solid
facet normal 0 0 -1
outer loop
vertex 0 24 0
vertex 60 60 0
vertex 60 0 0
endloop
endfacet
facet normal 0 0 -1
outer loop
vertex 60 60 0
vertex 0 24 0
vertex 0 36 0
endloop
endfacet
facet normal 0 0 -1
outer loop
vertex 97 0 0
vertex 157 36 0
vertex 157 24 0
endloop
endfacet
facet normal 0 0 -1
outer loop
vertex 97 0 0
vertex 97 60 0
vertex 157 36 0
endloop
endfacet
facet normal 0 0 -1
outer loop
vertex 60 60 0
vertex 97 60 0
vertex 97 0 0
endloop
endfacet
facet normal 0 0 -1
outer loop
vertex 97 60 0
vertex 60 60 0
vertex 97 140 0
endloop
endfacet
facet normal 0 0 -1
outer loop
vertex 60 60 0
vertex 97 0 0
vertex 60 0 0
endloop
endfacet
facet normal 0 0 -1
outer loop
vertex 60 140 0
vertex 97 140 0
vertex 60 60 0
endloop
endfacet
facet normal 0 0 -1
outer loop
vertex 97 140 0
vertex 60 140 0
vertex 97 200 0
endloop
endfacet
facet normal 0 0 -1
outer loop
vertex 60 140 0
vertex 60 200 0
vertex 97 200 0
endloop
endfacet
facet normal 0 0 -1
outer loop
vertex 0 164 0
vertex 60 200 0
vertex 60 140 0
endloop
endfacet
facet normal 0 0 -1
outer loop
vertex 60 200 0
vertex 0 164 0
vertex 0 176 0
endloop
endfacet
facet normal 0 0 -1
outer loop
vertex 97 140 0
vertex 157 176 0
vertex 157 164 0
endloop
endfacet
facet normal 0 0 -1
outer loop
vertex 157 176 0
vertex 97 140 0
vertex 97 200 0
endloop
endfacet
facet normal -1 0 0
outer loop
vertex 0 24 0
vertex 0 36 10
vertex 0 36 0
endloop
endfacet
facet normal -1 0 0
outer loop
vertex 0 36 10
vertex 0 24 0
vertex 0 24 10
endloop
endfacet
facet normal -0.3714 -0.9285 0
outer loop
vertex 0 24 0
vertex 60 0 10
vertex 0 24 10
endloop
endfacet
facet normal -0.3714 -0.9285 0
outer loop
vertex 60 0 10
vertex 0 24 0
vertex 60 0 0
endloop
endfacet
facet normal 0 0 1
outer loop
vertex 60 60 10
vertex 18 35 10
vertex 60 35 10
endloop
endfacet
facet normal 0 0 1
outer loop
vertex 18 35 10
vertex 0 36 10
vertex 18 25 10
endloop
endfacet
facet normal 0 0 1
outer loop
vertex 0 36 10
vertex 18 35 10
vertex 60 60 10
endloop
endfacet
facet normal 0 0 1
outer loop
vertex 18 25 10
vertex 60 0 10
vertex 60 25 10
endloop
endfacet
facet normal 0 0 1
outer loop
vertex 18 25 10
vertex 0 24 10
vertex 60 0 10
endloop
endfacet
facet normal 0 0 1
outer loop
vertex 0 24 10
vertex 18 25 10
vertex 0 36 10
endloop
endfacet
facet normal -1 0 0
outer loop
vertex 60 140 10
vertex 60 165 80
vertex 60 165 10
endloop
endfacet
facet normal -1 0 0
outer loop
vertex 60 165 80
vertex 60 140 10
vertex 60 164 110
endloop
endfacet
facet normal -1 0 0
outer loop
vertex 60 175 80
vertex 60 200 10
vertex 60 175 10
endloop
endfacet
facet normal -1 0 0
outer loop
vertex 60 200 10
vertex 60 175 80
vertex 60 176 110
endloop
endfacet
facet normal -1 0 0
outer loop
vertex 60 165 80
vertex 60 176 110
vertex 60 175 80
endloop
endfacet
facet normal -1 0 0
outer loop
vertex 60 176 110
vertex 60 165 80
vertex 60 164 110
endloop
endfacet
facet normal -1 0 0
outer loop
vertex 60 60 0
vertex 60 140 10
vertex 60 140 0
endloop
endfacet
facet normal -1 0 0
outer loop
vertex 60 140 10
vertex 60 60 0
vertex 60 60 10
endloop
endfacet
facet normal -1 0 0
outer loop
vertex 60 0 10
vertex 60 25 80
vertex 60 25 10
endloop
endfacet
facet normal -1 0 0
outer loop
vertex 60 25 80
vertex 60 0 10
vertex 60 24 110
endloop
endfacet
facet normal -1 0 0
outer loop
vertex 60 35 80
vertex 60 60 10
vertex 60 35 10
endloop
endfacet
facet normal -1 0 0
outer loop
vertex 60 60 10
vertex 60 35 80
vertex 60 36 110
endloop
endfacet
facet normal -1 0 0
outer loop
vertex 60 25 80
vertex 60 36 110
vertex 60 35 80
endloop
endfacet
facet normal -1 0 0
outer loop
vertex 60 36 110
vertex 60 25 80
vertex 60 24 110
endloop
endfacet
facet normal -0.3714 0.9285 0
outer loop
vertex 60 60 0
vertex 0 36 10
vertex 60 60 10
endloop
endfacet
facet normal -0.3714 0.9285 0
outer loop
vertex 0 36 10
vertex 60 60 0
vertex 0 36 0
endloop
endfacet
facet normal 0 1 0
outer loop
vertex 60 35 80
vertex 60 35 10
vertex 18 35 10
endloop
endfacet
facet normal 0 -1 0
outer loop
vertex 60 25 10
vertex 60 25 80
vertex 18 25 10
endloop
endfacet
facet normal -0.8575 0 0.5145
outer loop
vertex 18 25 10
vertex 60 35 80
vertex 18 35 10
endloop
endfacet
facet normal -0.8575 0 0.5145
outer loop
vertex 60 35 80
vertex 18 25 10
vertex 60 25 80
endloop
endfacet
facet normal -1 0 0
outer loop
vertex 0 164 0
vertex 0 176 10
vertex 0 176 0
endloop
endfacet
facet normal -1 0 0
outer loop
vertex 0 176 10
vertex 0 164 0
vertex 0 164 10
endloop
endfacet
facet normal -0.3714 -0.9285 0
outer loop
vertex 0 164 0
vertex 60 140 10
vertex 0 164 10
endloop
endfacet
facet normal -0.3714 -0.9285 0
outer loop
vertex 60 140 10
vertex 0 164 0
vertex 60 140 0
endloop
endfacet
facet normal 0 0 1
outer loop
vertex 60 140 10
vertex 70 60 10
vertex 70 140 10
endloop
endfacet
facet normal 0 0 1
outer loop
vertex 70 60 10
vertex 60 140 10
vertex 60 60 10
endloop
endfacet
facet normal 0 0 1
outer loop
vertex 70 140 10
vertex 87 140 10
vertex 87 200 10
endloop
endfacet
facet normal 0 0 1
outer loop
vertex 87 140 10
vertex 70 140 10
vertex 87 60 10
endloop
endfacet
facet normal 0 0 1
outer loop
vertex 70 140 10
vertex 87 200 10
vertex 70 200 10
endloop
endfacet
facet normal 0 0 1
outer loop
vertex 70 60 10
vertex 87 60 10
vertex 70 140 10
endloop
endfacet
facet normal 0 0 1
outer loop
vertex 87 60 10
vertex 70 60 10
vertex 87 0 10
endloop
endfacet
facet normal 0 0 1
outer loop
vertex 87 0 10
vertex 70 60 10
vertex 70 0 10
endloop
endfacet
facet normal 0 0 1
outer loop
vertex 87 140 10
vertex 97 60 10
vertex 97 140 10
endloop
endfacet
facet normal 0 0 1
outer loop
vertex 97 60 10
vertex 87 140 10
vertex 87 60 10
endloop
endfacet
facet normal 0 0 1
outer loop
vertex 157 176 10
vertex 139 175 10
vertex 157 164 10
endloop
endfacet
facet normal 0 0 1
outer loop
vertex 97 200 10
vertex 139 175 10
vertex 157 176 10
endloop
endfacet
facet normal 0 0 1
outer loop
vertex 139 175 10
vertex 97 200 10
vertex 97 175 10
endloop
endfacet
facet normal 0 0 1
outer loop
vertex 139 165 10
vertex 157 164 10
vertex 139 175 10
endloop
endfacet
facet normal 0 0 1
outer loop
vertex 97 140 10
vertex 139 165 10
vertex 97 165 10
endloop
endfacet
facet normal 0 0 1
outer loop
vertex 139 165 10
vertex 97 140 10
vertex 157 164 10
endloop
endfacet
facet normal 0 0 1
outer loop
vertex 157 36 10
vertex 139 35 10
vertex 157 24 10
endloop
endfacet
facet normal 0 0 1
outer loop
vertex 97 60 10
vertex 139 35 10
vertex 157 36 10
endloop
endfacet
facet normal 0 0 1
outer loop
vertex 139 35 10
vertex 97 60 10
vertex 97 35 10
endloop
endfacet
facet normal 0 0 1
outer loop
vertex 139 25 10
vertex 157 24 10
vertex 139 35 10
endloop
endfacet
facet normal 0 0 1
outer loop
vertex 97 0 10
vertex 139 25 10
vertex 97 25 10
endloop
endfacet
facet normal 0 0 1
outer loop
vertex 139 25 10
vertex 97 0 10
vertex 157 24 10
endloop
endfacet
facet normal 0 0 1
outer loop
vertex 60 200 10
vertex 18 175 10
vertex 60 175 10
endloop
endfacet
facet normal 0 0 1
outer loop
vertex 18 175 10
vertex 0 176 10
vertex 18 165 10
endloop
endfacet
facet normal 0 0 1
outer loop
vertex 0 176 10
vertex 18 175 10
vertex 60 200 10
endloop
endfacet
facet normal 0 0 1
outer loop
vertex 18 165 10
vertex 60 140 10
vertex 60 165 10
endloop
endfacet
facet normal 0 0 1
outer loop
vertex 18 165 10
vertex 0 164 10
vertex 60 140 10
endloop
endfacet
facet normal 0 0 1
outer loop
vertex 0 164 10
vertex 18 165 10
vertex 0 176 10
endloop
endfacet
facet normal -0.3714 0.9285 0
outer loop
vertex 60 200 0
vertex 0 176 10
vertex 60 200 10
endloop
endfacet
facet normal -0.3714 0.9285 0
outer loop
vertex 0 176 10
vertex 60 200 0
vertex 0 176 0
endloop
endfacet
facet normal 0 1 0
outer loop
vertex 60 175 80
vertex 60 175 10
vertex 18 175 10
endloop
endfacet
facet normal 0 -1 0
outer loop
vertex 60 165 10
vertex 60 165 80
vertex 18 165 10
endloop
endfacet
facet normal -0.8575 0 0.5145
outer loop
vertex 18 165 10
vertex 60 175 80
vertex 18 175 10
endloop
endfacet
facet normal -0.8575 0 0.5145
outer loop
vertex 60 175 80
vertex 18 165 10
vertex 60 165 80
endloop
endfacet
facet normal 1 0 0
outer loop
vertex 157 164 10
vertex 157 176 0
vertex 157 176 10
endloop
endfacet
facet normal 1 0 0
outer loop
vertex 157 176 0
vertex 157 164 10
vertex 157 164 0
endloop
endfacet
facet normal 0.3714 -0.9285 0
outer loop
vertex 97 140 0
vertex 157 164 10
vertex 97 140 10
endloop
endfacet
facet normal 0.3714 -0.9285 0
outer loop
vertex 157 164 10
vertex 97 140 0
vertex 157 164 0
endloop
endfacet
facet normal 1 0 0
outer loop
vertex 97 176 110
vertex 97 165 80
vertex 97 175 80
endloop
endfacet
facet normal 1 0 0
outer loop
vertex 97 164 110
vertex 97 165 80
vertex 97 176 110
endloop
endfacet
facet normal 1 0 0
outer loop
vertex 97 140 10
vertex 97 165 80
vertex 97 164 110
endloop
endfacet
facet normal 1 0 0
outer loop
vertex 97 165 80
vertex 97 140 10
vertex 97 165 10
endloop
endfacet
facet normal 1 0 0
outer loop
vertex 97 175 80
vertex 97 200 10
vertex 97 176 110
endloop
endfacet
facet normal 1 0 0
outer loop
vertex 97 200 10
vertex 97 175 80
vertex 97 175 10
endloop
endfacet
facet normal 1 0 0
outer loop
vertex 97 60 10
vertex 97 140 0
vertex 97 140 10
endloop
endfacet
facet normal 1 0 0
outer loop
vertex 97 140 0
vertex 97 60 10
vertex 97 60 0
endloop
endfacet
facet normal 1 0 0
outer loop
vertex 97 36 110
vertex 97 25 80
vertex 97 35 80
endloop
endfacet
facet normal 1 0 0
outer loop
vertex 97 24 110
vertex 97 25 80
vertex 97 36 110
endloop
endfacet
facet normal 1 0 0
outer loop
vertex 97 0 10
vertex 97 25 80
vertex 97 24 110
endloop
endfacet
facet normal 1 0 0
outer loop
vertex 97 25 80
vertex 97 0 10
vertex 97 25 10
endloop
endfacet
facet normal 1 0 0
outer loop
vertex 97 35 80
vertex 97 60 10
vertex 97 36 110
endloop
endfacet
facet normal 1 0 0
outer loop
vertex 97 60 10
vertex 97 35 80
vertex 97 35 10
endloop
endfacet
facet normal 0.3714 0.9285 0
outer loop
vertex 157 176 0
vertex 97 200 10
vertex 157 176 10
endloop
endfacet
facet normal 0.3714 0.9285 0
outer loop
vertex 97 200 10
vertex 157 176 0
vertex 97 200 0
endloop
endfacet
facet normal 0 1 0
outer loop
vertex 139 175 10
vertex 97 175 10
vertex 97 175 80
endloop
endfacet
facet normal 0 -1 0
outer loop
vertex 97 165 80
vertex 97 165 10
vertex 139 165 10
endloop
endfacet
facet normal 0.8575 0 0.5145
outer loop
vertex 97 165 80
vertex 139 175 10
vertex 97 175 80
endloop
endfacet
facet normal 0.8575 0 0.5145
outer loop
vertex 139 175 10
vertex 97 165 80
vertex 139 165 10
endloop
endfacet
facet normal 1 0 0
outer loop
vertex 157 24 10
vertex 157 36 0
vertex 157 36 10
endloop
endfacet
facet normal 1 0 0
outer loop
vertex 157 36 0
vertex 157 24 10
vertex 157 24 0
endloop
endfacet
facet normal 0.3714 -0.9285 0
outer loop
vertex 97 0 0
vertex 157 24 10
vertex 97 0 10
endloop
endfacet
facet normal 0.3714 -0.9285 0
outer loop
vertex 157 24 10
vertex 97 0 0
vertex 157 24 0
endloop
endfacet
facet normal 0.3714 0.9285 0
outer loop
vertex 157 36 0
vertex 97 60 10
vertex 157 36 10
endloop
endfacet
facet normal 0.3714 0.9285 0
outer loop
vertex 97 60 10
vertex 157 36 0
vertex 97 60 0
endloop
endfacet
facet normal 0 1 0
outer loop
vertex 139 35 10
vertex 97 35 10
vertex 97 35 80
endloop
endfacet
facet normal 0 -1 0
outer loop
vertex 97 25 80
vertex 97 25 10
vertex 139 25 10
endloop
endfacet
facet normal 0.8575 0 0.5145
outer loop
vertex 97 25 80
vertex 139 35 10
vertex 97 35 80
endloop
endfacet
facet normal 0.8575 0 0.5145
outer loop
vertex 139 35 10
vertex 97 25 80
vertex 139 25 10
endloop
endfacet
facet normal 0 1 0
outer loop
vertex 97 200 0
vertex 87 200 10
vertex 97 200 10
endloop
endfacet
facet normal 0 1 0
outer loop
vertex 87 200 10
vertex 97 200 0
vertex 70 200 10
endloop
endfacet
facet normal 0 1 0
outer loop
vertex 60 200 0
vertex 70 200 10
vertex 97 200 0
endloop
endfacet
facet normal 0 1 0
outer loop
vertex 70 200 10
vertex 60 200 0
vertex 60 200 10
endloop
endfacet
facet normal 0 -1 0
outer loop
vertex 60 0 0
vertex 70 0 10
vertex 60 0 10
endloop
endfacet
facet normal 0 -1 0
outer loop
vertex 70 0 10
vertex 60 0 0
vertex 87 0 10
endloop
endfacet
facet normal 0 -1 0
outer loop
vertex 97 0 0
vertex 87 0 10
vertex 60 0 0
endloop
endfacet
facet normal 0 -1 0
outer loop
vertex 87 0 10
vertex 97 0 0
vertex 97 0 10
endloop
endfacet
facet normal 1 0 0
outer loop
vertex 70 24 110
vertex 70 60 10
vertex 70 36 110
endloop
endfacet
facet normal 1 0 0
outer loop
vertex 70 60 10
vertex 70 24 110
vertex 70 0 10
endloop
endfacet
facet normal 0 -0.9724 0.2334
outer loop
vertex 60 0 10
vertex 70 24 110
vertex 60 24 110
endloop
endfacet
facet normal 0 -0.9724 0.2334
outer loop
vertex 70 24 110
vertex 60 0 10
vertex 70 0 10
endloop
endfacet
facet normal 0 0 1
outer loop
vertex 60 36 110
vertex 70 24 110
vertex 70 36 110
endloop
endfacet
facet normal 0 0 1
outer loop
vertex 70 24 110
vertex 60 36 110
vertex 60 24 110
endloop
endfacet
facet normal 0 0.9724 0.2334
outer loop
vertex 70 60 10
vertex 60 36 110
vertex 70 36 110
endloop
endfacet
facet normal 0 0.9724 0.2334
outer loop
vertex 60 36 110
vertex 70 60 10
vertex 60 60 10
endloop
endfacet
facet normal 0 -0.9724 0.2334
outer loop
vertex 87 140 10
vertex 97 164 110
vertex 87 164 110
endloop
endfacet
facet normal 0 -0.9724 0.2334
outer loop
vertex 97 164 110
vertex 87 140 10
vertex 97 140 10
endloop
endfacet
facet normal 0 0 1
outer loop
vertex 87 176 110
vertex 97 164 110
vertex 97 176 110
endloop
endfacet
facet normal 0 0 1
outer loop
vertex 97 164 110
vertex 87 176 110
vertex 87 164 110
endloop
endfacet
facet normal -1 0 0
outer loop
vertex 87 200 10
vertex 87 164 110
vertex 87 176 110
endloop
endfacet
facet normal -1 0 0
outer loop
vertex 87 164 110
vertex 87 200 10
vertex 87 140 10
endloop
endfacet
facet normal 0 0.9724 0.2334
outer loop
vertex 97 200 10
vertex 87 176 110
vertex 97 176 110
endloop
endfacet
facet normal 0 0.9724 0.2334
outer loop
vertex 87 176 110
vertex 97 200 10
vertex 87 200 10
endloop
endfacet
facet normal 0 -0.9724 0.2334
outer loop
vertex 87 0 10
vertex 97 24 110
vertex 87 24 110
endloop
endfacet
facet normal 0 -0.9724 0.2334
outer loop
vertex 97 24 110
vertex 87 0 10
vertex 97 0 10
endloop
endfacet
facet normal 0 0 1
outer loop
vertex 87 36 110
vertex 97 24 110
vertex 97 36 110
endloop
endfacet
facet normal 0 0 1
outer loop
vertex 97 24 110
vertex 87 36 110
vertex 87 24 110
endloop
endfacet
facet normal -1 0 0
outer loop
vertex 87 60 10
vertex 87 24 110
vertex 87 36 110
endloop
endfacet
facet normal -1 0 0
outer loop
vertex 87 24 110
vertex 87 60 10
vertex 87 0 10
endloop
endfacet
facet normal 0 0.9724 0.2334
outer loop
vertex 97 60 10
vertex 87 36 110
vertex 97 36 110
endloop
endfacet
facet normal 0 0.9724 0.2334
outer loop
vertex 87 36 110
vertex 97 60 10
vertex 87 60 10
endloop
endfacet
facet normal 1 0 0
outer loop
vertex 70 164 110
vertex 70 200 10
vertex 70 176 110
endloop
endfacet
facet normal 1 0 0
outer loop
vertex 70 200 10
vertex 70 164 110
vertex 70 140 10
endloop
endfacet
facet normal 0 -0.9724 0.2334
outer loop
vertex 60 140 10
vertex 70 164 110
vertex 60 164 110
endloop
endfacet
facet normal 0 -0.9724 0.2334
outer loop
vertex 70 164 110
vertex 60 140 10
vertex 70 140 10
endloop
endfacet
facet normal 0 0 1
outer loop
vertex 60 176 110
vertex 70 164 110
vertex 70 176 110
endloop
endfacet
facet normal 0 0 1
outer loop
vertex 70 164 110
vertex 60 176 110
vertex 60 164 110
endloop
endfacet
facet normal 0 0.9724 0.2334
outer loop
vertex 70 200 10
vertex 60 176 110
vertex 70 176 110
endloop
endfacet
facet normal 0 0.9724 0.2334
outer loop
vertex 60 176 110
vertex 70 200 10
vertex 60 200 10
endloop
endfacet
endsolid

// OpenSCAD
/**
 * A laptop stand, for holding the laptop vertically while plugged into a monitor.
 *
 * All measurements are in millimeters.
 *
 * Parameters:
 *   - lwid: Laptop width.
 *   - lhei: Laptop height.
 *   - ldep: Laptop depth.
 *   - slen: Stand length.
 *   - sswid: Width of base of stand uprights.
 *   - sstap: Taper percent of stand uprights.
 *   - suhei: Height of stand uprights.
 *   - sbwid: Width of the stand (long direction).
 *   - sthi: Thickness of all parts of the stand.
 *   - butwid: Buttress width.
 *   - butfact: Factor between buttress height and uptight height.
 *   - padding: Slot padding.
 */

// Laptop dimensions.
lwid = 304.1;
lhei = 212.4;
ldep = 15;

// Stand long dimensions.
slen = 200;
sswid = 60;
sstap = 0.6;
suhei = 100;
sbwid = 60;

// Stand thickness.
sthi = 10;

// Buttress dimensions.
butwid = 10;
butfact = 0.7;

// Additional padding factor for slot.
padding = 1;

module baseCorner() {
    polyhedron(
        points=[
            [0, 0, 0],
            [sbwid, sswid * (1 - sstap), 0],
            [sbwid, sswid * sstap, 0],
            [0, sswid, 0],
            [0, 0, sthi],
            [sbwid, sswid * (1 - sstap), sthi],
            [sbwid, sswid * sstap, sthi],
            [0, sswid, sthi],
        ],
        faces=[
            [0, 1, 2, 3],
            [4, 5, 1, 0],
            [7, 6, 5, 4],
            [5, 6, 2, 1],
            [6, 7, 3, 2],
            [7, 4, 0, 3],
        ]
    );
}

module buttress() {
    translate([0, (sswid + butwid) / 2, sthi])
        rotate([90, 0, 0])
            linear_extrude(butwid)
                polygon(
                    points=[
                        [0, 0],
                        [0, suhei*butfact],
                        [sbwid*butfact, 0],
                    ]);
}

sbtranslate = ldep + (2 * (padding + sthi)) + sbwid;

// Prints the four base corners.
translate([sbwid, 0, 0])
    mirror([1, 0, 0]) {
        baseCorner();
        buttress();
    }
translate([sbwid, slen - sswid, 0])
    mirror([1, 0, 0]) {
        baseCorner();
        buttress();
    }
translate([sbtranslate, slen - sswid, 0]) {
    baseCorner();
    buttress();
}
translate([sbtranslate, 0, 0]) {
    baseCorner();
    buttress();
}

// Prints the inside.
translate([sbwid, 0, 0, ])
    cube([ldep + (2 * (padding + sthi)), slen, sthi]);

module standUpright() {
    polyhedron(
        points=[
            [0, 0, 0],
            [sthi, 0, 0],
            [sthi, sswid, 0],
            [0, sswid, 0],
            [0, sswid * (1 - sstap), suhei],
            [sthi, sswid * (1 - sstap), suhei],
            [sthi, sswid * sstap, suhei],
            [0, sswid * sstap, suhei],
        ],
        faces=[
            [0, 1, 2, 3],
            [4, 5, 1, 0],
            [7, 6, 5, 4],
            [5, 6, 2, 1],
            [6, 7, 3, 2],
            [7, 4, 0, 3],
        ]
    );
}

// Prints the four uprights.
translate([sbwid, 0, sthi])
    standUpright();
translate([sbwid + ldep + (2 * padding + sthi), slen - sswid, sthi])
    standUpright();
translate([sbwid + ldep + (2 * padding + sthi), 0, sthi])
    standUpright();
translate([sbwid, slen - sswid, sthi])
    standUpright();
